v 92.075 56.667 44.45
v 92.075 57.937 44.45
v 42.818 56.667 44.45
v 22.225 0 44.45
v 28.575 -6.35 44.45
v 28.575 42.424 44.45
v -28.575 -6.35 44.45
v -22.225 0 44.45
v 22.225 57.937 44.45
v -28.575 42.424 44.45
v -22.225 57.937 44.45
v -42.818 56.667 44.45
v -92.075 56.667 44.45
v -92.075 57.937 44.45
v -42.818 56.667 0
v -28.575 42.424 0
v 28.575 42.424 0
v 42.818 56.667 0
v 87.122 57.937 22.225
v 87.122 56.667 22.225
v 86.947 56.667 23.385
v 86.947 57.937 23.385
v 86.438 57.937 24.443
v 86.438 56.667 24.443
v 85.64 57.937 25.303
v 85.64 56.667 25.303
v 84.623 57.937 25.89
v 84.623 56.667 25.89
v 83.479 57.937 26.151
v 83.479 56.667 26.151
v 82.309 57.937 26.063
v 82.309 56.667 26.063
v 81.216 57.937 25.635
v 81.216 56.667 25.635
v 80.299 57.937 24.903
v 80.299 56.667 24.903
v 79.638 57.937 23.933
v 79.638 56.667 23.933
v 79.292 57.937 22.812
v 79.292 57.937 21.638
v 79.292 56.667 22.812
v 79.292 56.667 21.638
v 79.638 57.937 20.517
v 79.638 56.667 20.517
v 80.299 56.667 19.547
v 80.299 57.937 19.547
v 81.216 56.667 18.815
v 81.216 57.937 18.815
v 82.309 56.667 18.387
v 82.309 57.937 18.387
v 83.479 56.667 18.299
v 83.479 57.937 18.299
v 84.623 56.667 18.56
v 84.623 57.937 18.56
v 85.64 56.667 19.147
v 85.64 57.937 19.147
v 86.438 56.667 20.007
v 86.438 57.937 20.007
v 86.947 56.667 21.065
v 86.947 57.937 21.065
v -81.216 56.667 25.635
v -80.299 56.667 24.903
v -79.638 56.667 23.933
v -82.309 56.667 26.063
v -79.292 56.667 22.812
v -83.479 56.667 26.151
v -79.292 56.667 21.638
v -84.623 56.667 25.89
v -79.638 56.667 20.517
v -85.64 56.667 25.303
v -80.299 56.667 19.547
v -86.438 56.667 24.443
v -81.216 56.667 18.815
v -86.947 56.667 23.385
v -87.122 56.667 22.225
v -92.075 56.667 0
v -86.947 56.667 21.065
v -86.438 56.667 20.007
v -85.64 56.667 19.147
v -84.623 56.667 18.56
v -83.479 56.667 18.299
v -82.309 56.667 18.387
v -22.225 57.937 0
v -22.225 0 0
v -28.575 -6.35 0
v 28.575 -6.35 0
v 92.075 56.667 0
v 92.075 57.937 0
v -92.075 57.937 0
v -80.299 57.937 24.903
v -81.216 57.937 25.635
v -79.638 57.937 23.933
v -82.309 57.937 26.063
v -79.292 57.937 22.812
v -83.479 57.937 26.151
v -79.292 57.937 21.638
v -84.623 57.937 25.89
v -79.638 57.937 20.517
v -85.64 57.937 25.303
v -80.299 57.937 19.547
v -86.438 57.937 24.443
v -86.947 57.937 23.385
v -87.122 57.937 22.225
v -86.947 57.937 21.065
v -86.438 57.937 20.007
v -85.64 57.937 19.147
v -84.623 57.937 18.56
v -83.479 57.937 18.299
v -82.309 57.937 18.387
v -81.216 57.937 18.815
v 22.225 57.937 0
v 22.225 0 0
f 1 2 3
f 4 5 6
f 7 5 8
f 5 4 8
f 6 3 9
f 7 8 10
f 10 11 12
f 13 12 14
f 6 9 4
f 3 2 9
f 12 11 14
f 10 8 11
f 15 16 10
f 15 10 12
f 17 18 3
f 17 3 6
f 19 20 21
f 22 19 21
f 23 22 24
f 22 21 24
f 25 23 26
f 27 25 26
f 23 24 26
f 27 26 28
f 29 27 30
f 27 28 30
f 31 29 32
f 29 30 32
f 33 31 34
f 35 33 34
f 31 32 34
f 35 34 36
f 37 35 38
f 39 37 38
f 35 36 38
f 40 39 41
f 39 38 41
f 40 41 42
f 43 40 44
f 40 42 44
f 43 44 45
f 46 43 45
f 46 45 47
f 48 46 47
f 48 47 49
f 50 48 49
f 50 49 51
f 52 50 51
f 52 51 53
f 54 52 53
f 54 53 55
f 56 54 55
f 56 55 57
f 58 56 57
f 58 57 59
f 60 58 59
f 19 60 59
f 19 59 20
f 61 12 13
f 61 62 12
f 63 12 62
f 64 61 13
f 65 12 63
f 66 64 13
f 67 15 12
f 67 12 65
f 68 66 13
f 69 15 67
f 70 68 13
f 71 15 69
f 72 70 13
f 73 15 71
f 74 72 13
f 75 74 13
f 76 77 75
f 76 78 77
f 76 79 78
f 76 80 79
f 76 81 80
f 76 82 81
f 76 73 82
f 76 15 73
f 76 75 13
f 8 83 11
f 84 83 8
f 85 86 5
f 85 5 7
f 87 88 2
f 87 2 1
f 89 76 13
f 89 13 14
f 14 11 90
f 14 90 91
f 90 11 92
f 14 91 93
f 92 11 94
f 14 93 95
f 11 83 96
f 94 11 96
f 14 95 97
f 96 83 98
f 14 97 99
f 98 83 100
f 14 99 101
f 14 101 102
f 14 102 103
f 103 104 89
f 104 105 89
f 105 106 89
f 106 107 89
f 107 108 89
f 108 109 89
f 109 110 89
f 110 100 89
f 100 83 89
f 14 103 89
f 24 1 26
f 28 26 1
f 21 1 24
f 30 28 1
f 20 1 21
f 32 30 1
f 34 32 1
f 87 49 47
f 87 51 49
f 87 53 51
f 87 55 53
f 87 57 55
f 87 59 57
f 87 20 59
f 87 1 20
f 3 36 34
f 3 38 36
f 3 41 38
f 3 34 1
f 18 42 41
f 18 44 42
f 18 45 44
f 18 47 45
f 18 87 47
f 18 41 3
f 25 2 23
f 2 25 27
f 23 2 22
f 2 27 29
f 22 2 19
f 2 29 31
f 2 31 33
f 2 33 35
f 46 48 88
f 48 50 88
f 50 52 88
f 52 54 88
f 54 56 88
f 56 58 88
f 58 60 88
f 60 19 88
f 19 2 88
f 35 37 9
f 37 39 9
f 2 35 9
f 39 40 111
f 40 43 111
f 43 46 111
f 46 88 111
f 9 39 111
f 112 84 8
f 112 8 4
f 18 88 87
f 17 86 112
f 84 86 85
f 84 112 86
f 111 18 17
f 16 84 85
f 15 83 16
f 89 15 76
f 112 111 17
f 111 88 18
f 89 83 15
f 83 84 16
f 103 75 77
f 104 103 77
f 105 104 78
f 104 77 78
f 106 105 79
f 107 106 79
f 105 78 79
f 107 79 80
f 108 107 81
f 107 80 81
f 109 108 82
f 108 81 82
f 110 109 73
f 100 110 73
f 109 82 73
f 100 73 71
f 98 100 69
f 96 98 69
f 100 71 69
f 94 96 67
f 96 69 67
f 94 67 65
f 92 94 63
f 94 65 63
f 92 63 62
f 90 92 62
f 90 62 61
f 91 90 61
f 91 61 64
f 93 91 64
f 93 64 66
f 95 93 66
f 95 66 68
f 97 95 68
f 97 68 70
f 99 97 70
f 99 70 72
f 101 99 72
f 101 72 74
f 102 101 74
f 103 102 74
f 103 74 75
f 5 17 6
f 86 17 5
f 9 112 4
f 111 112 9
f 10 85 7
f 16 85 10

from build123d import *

# Parameters (mm, degrees)
BOSS_EXTRUDE1_DEPTH = 44.45
SKETCH2_R           = 3.937
CUT_EXTRUDE1_DEPTH  = 121.103292327


with BuildPart() as part:
    # Sketch1 → Boss-Extrude1 (new body)
    with BuildSketch(Plane.XY):
        Polygon((-22.225, 0), (22.225, 0), (22.225, 57.9374), (28.575, 57.9374), (92.075, 57.9374), (92.075, 56.6674), (42.818141465, 56.6674), (28.575, 42.424258535), (28.575, -6.35), (-28.575, -6.35), (-28.575, 42.424258535), (-42.818141465, 56.6674), (-92.075, 56.6674), (-92.075, 57.9374), (-28.575, 57.9374), (-22.225, 57.9374), align=None)
    extrude(amount=BOSS_EXTRUDE1_DEPTH)

    # Sketch2 → Cut-Extrude1 (cut, through all)
    with BuildSketch(Plane.XZ.offset(-56.6674)):
        with Locations((83.185, 22.225)):
            Circle(SKETCH2_R)
        with Locations(Location((-83.185, 22.225, 0), (0, 0, 180))):
            Circle(SKETCH2_R)
    extrude(amount=-CUT_EXTRUDE1_DEPTH, mode=Mode.SUBTRACT)


solid = part.part
